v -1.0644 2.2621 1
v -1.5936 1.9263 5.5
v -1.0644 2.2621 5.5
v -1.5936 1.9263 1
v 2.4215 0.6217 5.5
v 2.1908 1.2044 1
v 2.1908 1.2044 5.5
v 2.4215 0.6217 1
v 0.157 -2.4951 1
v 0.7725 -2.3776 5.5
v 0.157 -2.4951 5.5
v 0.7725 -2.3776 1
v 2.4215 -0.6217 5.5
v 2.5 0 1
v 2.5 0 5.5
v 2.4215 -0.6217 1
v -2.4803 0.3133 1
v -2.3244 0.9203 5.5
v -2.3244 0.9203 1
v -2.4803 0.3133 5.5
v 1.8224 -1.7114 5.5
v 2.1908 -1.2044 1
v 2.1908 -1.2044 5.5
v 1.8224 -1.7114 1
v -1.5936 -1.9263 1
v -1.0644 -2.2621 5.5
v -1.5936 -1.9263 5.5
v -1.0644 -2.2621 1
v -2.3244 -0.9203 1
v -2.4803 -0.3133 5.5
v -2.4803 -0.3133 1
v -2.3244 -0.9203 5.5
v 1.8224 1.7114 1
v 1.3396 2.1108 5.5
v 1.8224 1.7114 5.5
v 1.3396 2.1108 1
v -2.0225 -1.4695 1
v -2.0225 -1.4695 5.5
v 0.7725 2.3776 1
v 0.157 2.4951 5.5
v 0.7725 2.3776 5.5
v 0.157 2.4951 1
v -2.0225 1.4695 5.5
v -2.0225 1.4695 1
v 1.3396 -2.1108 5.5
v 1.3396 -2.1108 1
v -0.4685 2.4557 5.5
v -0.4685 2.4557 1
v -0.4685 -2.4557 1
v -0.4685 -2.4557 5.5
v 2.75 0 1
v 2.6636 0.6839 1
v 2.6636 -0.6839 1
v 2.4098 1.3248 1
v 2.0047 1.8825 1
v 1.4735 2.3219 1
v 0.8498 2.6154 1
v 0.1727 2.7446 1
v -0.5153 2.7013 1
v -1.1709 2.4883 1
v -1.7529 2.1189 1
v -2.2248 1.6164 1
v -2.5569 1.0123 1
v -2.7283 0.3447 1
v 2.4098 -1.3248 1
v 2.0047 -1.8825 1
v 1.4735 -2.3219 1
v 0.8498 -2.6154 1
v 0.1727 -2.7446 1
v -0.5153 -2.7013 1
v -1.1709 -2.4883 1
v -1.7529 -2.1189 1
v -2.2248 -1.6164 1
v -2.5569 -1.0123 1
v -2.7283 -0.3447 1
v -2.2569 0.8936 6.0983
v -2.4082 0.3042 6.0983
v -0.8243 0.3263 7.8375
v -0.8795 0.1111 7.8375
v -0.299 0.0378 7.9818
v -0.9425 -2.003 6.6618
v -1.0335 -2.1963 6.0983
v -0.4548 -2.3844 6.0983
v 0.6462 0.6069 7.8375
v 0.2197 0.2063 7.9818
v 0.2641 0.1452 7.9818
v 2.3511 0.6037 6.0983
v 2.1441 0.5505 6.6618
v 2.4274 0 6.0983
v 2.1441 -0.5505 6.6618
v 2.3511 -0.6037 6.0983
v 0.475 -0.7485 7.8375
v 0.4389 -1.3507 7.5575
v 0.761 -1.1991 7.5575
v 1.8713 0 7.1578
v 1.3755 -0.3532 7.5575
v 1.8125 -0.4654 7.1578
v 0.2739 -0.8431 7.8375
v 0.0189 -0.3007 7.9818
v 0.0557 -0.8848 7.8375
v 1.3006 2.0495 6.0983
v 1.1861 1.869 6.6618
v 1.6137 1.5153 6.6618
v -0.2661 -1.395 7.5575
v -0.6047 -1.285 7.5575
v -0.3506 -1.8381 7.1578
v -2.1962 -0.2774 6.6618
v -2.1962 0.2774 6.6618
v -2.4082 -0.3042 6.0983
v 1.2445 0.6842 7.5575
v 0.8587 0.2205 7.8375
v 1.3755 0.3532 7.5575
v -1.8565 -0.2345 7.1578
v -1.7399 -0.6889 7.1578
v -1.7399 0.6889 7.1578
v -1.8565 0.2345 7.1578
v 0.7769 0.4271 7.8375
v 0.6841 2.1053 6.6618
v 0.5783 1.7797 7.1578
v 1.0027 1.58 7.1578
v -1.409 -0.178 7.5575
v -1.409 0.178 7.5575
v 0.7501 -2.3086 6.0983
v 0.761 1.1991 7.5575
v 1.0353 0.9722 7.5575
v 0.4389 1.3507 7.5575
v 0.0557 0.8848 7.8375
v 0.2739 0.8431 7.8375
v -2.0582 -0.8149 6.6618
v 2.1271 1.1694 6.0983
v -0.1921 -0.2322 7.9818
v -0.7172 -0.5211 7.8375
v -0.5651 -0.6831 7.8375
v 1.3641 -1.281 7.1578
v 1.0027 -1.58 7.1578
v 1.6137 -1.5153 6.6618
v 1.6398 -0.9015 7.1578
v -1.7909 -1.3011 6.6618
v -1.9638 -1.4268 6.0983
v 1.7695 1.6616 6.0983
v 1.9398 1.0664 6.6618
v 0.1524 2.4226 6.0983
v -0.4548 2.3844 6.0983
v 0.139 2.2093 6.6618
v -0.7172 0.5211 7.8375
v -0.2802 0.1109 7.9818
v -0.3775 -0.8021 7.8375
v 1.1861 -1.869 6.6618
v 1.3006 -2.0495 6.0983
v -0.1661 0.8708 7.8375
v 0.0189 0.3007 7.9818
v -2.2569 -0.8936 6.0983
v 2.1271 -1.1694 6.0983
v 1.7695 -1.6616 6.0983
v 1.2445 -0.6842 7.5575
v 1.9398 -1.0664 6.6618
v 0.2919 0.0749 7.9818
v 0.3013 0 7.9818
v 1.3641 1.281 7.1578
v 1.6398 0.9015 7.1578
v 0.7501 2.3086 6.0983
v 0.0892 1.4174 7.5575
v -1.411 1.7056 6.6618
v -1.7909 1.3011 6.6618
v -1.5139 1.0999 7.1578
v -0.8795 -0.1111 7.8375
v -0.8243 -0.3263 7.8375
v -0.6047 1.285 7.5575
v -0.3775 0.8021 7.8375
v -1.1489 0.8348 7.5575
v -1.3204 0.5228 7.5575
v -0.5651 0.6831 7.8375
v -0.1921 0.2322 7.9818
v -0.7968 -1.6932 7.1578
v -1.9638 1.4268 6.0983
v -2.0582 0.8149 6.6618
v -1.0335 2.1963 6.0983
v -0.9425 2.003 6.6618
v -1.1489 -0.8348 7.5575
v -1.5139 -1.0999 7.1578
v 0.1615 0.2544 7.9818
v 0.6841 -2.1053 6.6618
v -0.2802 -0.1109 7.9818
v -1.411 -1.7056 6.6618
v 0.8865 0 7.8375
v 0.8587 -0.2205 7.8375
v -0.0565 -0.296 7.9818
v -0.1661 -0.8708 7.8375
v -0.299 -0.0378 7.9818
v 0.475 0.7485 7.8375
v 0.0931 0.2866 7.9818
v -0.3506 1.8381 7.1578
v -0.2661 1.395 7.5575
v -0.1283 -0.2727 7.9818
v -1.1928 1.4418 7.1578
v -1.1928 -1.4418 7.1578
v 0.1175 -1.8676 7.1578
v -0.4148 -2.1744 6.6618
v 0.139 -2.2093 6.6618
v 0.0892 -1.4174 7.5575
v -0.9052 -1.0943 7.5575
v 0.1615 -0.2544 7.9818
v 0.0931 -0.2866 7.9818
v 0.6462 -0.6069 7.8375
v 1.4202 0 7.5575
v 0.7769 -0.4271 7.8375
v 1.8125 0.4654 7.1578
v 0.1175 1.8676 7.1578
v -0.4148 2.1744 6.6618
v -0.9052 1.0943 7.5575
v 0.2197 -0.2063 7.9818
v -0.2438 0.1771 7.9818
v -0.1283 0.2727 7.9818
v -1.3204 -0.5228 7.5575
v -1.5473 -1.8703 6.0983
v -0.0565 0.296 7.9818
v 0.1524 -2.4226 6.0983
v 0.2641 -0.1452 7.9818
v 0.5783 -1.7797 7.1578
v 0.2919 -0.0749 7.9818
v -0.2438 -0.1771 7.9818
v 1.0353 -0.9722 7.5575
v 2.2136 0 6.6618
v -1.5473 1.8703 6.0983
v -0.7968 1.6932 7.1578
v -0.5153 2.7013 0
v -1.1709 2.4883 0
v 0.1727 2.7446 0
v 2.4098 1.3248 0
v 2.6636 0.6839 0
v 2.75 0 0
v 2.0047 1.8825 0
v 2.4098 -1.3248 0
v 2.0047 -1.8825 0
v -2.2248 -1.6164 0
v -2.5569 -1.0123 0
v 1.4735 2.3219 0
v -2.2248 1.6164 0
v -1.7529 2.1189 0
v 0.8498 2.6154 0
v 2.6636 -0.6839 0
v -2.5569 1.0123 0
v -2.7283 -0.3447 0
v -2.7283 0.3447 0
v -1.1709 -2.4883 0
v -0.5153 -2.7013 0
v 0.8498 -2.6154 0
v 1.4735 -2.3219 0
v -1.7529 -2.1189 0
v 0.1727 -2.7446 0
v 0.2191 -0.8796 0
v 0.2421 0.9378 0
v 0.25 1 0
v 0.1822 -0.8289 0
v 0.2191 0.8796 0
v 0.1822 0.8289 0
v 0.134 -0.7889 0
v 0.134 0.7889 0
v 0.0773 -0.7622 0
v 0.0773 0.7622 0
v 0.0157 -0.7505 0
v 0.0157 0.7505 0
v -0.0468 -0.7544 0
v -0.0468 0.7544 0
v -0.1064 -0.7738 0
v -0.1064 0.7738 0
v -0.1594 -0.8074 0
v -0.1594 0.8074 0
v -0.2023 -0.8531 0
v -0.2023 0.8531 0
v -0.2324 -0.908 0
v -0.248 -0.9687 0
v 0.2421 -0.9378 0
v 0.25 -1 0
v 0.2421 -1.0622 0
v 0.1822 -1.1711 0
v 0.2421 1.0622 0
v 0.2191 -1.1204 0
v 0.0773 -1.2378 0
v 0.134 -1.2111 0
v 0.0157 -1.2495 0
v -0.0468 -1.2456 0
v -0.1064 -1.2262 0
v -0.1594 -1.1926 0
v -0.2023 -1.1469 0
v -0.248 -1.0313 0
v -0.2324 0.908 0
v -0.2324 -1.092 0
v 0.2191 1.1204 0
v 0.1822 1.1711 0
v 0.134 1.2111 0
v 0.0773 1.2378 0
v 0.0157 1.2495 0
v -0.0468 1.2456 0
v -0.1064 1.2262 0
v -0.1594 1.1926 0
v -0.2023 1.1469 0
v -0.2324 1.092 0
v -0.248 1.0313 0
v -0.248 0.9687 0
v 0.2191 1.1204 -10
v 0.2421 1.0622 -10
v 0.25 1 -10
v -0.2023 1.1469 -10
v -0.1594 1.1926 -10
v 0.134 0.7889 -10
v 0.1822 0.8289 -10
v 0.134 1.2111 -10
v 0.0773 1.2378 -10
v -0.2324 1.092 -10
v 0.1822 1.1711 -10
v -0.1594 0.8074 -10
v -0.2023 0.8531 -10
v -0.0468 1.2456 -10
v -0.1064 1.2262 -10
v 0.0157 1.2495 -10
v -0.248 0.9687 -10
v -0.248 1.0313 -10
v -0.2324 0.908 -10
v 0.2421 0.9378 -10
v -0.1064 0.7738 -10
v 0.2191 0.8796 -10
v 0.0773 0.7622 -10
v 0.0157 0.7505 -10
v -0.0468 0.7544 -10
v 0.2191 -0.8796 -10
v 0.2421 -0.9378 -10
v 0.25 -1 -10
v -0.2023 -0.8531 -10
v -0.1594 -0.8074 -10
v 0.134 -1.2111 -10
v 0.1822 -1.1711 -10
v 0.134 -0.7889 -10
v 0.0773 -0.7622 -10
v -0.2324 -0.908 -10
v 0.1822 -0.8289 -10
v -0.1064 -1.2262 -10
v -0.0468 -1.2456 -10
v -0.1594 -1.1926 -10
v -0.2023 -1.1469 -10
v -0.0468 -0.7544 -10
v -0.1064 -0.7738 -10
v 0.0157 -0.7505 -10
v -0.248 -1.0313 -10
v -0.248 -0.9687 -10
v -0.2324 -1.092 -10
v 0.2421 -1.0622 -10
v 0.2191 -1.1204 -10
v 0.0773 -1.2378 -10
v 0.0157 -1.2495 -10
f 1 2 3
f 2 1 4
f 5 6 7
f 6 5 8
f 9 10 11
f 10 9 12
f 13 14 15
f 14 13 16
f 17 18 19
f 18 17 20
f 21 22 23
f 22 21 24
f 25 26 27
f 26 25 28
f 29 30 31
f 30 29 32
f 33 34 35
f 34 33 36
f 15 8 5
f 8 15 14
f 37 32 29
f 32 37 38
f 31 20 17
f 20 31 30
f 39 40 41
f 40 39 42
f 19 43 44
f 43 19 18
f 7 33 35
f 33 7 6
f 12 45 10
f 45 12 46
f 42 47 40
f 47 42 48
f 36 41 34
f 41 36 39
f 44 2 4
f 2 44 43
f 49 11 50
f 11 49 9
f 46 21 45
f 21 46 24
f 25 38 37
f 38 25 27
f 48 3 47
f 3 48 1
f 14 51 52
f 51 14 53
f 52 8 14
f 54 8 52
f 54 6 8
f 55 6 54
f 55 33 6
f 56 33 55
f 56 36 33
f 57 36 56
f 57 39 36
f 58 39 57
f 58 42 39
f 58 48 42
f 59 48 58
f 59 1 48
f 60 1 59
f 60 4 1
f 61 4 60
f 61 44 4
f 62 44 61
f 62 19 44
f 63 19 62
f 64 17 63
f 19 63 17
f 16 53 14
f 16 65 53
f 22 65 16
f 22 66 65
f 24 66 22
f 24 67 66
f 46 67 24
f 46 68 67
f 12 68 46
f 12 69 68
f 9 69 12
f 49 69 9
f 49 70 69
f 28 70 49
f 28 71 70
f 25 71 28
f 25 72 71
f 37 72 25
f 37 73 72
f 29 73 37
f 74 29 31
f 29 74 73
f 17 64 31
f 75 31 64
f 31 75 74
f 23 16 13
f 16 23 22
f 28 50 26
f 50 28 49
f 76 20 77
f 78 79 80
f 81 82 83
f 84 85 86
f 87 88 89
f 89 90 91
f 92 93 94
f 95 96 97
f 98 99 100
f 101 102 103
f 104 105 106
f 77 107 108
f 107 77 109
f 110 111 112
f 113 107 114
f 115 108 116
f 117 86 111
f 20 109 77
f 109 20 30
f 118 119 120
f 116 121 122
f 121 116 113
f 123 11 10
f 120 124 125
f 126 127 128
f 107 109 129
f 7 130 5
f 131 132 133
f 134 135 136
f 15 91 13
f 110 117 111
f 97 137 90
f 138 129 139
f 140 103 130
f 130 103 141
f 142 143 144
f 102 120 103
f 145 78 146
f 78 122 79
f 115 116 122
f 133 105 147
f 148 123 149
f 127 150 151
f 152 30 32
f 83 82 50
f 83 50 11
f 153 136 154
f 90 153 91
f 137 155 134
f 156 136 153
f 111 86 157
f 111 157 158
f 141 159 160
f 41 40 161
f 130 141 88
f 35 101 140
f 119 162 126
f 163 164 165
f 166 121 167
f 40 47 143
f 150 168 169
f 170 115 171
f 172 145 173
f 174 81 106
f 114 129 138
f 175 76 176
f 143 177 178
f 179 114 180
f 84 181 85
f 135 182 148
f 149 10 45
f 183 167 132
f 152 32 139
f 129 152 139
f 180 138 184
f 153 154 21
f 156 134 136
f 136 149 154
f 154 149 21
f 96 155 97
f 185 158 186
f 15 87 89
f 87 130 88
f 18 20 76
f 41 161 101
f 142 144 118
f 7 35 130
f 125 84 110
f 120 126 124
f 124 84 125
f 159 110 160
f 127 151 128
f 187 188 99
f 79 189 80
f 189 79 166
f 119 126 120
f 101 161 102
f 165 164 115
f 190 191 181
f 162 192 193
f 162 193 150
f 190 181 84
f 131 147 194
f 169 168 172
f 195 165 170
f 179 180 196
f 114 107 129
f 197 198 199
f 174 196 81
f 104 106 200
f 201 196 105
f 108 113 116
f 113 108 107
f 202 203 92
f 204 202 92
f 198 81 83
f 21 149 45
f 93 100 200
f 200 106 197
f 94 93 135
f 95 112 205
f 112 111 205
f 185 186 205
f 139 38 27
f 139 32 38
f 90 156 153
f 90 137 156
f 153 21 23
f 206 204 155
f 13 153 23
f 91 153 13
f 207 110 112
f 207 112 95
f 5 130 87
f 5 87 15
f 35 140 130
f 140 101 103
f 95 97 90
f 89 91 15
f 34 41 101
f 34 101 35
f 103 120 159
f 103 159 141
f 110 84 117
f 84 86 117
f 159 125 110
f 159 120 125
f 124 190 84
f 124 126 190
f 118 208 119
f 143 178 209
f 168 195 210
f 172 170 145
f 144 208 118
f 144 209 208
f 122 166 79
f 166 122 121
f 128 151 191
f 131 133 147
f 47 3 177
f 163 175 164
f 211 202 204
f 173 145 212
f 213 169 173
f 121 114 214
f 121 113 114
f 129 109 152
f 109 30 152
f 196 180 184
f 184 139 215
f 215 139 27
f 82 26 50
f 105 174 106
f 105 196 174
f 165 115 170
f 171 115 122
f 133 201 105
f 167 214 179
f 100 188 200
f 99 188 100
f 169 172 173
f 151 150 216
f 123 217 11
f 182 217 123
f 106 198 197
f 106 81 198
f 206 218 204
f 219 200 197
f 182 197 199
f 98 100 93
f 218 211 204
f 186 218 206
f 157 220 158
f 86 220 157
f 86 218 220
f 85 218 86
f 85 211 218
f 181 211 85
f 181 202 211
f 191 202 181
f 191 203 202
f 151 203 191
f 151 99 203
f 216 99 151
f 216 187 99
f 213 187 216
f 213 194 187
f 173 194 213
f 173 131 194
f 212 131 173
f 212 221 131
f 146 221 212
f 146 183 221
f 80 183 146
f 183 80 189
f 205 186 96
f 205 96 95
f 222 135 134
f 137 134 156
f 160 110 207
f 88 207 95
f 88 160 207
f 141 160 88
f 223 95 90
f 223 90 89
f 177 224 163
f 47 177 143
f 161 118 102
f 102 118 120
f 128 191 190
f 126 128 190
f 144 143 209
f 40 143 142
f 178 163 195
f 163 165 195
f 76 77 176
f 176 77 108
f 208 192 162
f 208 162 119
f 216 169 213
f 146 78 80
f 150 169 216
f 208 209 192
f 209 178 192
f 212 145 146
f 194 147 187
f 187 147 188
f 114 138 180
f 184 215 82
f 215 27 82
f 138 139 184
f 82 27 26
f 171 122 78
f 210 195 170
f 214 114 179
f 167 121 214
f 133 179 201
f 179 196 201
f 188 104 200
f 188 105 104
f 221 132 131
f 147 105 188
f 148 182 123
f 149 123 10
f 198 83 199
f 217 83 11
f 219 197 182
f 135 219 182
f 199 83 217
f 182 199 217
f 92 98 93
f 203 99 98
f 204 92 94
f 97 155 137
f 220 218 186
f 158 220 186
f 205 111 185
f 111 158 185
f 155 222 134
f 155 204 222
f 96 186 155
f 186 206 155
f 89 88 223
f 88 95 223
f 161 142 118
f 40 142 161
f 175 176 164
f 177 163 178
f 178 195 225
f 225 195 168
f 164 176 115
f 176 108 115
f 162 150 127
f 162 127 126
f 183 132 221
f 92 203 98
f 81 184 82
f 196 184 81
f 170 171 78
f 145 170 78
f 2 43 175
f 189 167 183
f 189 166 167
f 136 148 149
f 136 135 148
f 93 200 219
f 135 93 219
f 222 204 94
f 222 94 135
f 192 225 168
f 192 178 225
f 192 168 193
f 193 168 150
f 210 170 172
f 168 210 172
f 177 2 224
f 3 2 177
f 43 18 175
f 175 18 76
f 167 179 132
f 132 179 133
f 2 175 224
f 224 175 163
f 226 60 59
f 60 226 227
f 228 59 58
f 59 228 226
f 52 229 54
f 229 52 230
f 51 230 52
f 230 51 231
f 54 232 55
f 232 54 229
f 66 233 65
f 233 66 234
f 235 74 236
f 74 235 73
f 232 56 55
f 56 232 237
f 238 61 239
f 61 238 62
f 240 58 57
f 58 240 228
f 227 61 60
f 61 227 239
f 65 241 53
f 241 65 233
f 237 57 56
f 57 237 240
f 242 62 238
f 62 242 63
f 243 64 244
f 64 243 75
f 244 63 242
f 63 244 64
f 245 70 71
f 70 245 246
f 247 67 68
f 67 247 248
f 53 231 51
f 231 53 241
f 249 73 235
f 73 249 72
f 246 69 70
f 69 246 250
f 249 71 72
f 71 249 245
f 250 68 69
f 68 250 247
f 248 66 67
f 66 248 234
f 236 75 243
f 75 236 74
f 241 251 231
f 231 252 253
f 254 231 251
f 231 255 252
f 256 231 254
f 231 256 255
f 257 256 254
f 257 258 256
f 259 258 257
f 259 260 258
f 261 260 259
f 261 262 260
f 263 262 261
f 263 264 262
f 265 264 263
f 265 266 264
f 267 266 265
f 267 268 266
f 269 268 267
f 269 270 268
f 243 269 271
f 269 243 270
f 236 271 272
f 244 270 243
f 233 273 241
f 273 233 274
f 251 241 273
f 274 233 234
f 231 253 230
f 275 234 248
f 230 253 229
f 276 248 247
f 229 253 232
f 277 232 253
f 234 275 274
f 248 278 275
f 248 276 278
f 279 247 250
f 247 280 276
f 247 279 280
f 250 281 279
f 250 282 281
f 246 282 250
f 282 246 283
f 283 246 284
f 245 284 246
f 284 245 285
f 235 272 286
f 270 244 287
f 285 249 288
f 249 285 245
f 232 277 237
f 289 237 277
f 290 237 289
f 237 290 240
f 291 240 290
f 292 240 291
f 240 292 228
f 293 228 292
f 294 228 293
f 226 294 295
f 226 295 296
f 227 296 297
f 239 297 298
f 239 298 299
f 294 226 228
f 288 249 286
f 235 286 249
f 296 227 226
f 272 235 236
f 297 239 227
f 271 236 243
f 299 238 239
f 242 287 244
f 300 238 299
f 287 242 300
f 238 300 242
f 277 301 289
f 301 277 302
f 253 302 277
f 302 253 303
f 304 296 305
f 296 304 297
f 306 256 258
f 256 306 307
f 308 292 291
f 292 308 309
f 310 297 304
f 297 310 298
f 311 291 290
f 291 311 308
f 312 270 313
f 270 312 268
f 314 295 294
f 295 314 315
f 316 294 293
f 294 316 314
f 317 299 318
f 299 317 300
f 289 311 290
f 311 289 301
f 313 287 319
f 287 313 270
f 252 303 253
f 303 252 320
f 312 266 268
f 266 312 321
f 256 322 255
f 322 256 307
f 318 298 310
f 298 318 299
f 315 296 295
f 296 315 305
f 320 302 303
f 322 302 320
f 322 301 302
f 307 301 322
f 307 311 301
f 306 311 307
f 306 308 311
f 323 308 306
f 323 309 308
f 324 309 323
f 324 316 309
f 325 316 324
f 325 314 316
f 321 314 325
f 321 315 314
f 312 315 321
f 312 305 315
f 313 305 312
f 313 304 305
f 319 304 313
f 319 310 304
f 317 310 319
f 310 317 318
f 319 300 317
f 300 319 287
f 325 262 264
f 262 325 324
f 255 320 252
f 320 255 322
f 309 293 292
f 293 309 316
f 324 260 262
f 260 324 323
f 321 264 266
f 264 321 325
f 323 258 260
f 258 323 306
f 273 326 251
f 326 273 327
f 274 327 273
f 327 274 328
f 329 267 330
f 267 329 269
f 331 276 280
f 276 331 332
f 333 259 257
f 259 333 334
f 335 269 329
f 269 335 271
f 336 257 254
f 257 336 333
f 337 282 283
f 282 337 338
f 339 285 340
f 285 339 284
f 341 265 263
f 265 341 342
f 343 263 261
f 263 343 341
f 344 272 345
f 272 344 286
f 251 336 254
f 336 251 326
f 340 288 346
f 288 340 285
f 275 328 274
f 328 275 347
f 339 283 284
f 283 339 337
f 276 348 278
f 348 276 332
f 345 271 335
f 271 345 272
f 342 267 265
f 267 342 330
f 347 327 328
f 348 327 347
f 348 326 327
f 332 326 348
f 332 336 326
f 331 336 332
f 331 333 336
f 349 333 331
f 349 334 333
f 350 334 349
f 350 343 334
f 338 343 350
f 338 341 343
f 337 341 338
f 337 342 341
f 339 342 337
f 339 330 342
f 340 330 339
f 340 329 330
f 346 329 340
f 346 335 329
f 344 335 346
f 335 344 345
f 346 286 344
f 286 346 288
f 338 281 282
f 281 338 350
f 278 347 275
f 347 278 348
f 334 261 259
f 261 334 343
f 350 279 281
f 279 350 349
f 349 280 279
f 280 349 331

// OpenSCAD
//LED Dimensions
led_d=5; //LED Diameter
led_h=8; //LED Height
led_fh=1; //LED FLange Thickness
led_fd=5.5; //LED Flange Diameter
wire_d=.5; //Wire Diameter
wire_h=10; //Wire Height
wire_da=2; // THe distance between the Wires
led();
module led(){
translate([0,0,led_fh])cylinder(led_h-(led_d/2)-led_fh,led_d/2,led_d/2, $fn=25);
translate([0,0,led_h-(led_d/2)])sphere(led_d/2,  $fn=25);
cylinder(led_fh,led_fd/2,led_fd/2, $fn=25);
translate([0,wire_da/2,-wire_h])cylinder(wire_h,wire_d/2,wire_d/2, $fn=25);
translate([0,wire_da/-2,-wire_h])cylinder(wire_h,wire_d/2,wire_d/2, $fn=25);
}
